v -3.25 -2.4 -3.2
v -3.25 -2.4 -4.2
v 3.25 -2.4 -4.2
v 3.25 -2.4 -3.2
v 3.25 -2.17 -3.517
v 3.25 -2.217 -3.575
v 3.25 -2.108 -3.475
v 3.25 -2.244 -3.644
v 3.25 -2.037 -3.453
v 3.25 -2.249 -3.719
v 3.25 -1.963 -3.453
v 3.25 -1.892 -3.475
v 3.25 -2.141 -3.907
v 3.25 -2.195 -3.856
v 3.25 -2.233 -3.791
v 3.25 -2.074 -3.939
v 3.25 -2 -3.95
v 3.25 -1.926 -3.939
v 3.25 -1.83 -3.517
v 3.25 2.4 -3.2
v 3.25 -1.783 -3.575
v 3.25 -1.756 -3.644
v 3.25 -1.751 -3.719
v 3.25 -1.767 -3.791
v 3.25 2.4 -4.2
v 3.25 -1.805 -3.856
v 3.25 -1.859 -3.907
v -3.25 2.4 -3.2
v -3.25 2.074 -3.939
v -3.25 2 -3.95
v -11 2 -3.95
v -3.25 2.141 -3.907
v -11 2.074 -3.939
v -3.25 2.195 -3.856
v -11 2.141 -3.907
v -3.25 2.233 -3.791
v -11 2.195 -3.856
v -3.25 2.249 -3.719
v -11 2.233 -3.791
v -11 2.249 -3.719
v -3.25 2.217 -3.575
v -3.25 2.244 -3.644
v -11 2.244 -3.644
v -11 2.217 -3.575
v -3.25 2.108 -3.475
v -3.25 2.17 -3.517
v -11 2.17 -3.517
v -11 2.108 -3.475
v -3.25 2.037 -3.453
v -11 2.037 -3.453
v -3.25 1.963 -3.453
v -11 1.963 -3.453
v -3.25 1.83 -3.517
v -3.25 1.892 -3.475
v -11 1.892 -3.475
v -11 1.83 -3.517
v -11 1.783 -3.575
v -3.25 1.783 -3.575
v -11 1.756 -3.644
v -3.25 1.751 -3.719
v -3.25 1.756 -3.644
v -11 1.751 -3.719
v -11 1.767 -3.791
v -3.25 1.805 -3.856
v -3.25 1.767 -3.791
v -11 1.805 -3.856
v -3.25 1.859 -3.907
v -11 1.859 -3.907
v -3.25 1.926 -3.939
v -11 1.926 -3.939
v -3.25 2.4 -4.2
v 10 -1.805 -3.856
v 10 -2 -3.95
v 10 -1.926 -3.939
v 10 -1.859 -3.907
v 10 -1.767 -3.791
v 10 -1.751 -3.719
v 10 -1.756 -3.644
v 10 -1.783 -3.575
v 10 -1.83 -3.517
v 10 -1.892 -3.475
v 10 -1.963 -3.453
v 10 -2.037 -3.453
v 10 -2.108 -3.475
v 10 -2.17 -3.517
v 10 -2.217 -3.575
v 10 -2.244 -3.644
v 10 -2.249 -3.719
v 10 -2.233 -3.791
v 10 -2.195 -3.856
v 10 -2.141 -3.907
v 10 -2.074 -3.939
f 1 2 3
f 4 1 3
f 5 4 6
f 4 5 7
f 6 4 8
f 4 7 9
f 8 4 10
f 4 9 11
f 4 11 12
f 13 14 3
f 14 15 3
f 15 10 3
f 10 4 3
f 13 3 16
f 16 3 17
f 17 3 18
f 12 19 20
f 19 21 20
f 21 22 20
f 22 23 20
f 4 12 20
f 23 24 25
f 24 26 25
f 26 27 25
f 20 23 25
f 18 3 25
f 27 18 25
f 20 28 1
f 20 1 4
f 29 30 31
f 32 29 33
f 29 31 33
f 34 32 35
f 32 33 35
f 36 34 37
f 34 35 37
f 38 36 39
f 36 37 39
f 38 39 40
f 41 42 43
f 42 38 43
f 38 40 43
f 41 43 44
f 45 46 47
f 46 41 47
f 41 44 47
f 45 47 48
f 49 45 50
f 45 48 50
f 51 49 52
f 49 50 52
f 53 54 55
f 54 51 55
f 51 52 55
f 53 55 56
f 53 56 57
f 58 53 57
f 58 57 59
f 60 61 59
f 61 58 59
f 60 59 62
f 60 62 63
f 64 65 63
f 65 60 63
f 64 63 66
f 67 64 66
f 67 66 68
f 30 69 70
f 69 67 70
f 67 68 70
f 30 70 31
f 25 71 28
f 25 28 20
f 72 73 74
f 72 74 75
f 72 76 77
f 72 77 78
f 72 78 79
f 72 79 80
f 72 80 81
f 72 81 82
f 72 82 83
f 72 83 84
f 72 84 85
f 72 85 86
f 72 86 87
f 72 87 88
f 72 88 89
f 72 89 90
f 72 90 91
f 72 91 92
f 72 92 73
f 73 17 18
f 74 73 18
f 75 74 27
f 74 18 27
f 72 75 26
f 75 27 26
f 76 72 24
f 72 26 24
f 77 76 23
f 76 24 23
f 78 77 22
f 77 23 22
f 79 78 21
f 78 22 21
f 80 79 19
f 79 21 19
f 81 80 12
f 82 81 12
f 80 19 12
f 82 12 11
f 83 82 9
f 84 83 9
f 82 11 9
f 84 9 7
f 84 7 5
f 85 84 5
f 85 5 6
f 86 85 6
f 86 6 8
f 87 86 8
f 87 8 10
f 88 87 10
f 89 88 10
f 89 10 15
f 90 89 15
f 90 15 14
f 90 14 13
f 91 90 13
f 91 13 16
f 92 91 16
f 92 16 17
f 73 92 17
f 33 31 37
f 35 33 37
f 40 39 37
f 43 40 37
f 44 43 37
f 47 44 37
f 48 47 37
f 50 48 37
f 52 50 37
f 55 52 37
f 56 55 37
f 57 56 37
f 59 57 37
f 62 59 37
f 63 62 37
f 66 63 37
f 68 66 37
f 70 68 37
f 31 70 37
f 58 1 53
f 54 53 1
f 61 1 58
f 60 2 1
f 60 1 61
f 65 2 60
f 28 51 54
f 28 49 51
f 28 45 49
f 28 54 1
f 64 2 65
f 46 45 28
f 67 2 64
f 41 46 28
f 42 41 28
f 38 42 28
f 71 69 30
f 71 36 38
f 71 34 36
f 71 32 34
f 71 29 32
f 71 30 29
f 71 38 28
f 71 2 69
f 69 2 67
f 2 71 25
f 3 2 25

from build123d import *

# Parameters (mm, degrees)
CYLINDER002_R           = 0.25
CYLINDER002_DEPTH       = 10
CYLINDER002_PITCH_ANGLE = 90
CYLINDER001_R           = 0.25
CYLINDER001_DEPTH       = 10
CYLINDER001_PITCH_ANGLE = 90
BOX_W                   = 6.5
BOX_H                   = 4.8
BOX_DEPTH               = 1


with BuildPart() as cylinder002:
    # Cylinder002 → Cylinder002 (new body)
    with BuildSketch(Plane.XY):
        Circle(CYLINDER002_R)
    extrude(amount=CYLINDER002_DEPTH)


with BuildPart() as cylinder002_1:
    # Cylinder002 pitch: moved
    add(cylinder002.part.rotate(Axis((0, 0, 0), (0, 1, 0)), CYLINDER002_PITCH_ANGLE))


with BuildPart() as cylinder002_2:
    # Cylinder002 placement: moved
    add(cylinder002_1.part.moved(Location((0, -2, -3.7))))


with BuildPart() as fusion002:
    # Cylinder001 → Cylinder001 (new body)
    with BuildSketch(Plane.XY):
        Circle(CYLINDER001_R)
    extrude(amount=CYLINDER001_DEPTH)


with BuildPart() as fusion002_1:
    # Cylinder001 pitch: moved
    add(fusion002.part.rotate(Axis((0, 0, 0), (0, 1, 0)), CYLINDER001_PITCH_ANGLE))


with BuildPart() as fusion002_2:
    # Cylinder001 placement: moved
    add(fusion002_1.part.moved(Location((-11, 2, -3.7))))

    # Fusion002: union Cylinder002
    add(cylinder002_2.part)


with BuildPart() as switch:
    # Box → Box (new body)
    with BuildSketch(Plane(origin=(-3.25, -2.4, -4.2), x_dir=(1, 0, 0), z_dir=(0, 0, 1))):
        with Locations((3.25, 2.4)):
            Rectangle(BOX_W, BOX_H)
    extrude(amount=BOX_DEPTH)

    # Fusion003: union Fusion002
    add(fusion002_2.part)


solid = switch.part
